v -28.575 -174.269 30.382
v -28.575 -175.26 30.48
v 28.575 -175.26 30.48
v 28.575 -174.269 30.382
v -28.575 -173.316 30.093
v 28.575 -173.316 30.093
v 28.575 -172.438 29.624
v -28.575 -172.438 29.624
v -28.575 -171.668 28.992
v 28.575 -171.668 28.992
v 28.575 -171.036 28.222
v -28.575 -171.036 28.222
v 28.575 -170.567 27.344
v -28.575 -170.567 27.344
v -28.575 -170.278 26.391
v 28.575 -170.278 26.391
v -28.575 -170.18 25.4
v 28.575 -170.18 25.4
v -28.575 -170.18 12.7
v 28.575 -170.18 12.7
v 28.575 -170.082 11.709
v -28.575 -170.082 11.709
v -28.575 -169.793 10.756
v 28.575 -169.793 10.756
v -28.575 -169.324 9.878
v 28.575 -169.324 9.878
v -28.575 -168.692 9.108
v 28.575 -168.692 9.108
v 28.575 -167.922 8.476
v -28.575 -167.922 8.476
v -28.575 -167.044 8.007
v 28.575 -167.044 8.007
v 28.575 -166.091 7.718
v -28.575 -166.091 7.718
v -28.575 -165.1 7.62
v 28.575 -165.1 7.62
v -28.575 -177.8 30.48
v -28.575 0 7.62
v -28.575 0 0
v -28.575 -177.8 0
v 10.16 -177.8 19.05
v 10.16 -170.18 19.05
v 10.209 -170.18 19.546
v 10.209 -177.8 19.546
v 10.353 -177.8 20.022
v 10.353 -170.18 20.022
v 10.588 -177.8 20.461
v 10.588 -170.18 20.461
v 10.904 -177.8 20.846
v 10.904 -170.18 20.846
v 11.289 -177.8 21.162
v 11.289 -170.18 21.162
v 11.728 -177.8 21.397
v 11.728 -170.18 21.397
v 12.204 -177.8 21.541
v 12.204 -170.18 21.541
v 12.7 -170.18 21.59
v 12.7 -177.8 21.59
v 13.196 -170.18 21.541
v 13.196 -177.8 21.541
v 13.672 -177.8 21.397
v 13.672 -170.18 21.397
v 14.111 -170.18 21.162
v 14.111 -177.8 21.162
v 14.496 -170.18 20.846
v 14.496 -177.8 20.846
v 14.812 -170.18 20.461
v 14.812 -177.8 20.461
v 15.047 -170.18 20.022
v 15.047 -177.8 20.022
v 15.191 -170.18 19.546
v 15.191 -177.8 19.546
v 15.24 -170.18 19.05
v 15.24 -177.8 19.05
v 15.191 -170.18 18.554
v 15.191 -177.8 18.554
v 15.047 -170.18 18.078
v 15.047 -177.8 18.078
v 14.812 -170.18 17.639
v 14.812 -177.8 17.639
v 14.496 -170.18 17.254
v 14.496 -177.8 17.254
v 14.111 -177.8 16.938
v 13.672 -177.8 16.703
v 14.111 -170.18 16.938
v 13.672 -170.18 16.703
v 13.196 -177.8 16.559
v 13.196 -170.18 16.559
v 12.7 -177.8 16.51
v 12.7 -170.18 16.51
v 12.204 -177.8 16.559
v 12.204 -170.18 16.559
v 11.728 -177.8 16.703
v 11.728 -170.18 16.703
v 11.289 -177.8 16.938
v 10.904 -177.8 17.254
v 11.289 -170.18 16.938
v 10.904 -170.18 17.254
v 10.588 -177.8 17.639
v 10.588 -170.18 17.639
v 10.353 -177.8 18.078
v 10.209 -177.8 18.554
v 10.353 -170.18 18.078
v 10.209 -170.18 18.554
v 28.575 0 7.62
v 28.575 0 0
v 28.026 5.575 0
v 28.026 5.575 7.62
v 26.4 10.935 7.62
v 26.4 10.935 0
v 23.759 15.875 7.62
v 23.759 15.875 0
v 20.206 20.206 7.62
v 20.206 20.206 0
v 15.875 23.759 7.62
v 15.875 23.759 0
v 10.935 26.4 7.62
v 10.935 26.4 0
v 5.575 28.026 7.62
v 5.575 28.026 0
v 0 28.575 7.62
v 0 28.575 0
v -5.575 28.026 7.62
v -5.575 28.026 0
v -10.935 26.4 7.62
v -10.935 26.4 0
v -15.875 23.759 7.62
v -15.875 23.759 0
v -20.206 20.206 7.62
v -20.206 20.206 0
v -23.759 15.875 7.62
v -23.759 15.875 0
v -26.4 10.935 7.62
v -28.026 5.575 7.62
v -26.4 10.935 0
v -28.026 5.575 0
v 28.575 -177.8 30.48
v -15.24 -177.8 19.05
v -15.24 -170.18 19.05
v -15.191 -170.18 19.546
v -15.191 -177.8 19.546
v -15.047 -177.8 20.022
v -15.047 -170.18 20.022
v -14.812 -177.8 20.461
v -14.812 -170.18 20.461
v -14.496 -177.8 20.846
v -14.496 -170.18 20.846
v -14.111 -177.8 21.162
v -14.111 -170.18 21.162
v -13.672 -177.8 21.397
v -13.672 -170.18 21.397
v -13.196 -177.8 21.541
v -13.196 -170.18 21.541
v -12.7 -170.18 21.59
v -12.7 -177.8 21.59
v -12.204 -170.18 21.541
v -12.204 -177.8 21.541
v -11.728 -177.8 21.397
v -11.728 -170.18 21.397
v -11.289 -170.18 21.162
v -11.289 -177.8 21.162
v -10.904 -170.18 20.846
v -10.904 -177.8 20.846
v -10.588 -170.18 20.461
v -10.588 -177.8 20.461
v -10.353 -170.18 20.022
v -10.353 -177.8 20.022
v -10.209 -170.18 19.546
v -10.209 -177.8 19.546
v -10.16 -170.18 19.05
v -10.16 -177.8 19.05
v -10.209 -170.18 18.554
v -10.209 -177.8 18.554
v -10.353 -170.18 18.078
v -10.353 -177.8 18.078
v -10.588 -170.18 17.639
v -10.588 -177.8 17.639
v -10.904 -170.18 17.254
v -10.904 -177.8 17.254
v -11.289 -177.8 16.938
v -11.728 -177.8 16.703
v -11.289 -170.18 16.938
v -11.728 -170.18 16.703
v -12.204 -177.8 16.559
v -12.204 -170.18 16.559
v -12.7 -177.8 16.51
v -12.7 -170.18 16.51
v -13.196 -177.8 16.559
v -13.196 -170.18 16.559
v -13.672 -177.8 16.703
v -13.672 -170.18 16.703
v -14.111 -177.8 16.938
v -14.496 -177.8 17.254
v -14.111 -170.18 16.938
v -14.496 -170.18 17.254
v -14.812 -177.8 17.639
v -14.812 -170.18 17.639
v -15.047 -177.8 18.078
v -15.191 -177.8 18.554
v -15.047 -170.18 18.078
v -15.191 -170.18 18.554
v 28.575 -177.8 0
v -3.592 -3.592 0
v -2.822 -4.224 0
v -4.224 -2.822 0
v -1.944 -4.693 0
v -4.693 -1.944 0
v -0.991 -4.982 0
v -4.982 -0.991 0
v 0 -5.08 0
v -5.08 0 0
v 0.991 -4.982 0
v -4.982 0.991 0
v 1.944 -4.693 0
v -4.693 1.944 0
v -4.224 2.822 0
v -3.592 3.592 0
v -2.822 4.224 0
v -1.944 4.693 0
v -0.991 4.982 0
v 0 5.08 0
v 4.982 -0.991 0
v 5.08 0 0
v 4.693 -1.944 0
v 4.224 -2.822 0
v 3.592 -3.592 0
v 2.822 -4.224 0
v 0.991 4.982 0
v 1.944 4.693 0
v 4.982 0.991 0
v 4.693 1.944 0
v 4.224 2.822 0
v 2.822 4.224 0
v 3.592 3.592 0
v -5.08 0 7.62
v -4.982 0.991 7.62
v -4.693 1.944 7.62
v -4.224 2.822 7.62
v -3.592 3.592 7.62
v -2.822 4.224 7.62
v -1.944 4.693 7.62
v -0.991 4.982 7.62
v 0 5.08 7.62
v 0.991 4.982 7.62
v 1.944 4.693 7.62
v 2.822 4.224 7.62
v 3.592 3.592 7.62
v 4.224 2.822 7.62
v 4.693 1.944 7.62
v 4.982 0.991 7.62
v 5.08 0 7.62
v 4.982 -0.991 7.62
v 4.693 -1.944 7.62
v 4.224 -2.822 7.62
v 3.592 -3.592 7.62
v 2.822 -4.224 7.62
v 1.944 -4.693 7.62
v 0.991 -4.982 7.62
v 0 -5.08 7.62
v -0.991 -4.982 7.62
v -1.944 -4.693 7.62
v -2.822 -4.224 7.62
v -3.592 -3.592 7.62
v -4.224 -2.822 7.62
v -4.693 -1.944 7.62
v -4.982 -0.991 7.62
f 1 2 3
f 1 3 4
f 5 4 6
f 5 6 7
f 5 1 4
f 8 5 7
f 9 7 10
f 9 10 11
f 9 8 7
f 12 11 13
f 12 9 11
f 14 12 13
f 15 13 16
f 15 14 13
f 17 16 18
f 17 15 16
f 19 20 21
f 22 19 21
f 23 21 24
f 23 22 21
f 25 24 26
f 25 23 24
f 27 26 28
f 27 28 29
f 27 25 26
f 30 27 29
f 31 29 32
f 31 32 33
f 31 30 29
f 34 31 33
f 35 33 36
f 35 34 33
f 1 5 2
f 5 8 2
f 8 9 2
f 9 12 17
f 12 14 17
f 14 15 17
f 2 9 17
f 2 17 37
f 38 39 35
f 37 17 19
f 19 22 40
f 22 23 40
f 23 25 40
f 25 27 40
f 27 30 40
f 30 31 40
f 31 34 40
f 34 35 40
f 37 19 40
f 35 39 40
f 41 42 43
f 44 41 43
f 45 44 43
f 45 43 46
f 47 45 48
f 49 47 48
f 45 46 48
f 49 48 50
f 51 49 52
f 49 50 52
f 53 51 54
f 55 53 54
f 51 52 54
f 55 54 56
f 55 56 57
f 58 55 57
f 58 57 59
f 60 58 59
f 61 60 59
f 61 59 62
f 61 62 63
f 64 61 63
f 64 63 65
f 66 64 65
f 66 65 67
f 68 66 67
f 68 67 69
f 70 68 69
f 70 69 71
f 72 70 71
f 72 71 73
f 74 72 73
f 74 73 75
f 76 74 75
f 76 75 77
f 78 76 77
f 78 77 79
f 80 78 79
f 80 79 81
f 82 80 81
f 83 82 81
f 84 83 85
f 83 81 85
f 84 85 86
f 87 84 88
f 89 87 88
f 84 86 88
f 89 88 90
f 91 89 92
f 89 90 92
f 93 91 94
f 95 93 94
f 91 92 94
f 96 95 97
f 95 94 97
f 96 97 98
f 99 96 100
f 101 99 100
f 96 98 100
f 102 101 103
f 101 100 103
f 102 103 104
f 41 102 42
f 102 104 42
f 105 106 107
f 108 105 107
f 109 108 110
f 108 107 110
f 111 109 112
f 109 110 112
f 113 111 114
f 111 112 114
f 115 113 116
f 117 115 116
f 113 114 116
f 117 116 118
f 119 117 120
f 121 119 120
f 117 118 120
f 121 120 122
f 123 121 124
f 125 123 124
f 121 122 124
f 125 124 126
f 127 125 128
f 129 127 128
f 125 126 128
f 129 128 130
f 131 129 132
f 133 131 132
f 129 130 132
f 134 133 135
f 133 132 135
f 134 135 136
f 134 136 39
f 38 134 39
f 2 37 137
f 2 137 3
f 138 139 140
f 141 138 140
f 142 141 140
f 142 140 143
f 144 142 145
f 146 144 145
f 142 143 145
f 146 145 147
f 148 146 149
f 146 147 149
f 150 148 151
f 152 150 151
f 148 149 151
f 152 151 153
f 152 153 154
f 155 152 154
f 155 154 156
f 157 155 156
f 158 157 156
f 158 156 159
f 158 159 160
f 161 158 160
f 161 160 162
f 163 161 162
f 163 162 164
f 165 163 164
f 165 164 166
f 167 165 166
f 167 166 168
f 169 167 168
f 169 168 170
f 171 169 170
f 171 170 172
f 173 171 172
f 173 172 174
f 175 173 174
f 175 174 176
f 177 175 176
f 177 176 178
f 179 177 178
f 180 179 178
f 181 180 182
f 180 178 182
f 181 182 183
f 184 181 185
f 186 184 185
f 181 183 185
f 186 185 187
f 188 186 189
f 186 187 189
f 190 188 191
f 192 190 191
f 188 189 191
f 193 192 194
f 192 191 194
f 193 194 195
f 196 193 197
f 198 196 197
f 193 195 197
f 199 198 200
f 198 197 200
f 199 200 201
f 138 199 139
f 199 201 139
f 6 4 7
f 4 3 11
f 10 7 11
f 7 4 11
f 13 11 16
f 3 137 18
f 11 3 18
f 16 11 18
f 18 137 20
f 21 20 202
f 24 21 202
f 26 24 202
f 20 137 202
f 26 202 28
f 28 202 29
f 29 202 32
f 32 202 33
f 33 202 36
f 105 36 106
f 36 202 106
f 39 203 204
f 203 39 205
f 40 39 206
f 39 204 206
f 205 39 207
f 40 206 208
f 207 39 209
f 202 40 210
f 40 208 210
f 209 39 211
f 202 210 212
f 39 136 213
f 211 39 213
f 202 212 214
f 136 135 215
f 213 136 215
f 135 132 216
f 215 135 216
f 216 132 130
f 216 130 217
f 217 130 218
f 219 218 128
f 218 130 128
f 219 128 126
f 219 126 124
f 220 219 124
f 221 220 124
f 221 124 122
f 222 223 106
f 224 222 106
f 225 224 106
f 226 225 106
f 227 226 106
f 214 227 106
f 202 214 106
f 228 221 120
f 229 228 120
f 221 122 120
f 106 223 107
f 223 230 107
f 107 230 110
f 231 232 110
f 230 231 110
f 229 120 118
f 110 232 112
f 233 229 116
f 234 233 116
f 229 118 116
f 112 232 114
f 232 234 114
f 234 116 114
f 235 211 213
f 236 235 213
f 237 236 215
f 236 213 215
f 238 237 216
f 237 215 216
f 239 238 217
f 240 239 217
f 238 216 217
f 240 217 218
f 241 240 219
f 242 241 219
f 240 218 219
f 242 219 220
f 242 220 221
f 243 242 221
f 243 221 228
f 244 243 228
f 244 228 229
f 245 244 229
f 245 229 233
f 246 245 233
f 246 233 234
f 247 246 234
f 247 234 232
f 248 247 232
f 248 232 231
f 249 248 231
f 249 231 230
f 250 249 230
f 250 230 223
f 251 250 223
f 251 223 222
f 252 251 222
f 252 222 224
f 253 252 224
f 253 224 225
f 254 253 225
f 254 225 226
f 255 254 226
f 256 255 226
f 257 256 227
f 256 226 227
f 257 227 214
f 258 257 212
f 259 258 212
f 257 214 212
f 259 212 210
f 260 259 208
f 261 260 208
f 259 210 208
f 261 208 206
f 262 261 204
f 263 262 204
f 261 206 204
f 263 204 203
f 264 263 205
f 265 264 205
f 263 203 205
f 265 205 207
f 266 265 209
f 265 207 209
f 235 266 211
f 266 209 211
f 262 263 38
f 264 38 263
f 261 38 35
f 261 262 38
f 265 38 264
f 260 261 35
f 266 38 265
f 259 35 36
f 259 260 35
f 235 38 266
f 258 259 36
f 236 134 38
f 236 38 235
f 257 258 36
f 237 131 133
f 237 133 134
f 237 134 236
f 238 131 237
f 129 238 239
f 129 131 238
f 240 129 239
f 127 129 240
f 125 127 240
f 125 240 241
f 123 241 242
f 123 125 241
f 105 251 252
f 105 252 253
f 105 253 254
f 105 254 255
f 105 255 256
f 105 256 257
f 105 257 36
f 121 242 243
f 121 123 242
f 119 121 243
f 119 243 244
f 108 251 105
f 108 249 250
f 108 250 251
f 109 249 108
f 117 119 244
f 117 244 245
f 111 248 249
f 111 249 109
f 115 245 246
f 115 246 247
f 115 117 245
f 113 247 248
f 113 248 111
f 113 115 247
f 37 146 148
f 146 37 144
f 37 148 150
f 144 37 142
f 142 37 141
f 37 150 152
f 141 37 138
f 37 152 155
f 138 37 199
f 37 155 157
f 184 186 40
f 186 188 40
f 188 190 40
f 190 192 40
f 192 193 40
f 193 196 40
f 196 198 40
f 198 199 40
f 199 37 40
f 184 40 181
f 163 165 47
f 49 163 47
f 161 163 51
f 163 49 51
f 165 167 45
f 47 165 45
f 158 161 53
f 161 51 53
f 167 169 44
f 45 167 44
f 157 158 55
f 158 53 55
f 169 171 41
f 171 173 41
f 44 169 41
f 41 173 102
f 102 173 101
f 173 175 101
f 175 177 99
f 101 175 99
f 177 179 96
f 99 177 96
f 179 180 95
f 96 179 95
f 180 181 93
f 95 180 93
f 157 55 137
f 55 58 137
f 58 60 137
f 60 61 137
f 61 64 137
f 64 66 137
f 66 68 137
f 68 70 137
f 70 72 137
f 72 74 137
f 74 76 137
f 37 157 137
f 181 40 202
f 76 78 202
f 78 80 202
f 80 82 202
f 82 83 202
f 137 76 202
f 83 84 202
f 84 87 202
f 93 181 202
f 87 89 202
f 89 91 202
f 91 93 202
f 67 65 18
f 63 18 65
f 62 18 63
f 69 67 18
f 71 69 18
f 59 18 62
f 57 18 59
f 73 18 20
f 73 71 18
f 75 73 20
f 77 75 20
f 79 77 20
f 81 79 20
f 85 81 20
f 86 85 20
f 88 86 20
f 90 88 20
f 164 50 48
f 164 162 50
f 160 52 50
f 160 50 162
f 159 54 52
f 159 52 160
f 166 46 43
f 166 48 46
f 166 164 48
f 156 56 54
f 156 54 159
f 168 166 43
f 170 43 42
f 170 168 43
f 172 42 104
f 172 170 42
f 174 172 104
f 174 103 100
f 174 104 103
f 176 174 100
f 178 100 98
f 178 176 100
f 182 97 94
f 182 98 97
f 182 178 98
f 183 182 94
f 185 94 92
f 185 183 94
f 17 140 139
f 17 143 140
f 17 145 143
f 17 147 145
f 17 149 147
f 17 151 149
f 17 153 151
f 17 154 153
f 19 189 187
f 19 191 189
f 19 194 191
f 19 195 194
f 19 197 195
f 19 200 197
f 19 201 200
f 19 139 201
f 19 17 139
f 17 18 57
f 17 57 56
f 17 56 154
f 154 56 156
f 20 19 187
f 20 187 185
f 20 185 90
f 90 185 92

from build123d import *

# Parameters (mm, degrees)
BOSS_EXTRUDE1_DEPTH = 7.62
BOSS_EXTRUDE2_DEPTH = 57.15
FILLET1_R           = 5.08
SKETCH3_R           = 2.54
CUT_EXTRUDE1_DEPTH  = 204.09877166
SKETCH4_R           = 5.08
CUT_EXTRUDE2_DEPTH  = 183.642823634


with BuildPart() as part:
    # Sketch1 → Boss-Extrude1 (new body)
    with BuildSketch(Plane.XY):
        with BuildLine():
            Line((-28.575, 0), (-28.575, -177.8))
            Line((-28.575, -177.8), (28.575, -177.8))
            Line((28.575, -177.8), (28.575, 0))
            ThreePointArc((28.575, 0), (0, 28.575), (-28.575, 0))
        make_face()
    extrude(amount=BOSS_EXTRUDE1_DEPTH)

    # Sketch2 → Boss-Extrude2 (add, through all)
    with BuildSketch(Plane.ZY.offset(28.575)):
        with BuildLine():
            Line((0, -177.8), (30.48, -177.8))
            Line((30.48, -177.8), (30.48, -175.26))
            ThreePointArc((30.48, -175.26), (28.992102448, -171.667897552), (25.4, -170.18))
            Line((25.4, -170.18), (0, -170.18))
            Line((0, -170.18), (0, -177.8))
        make_face()
    extrude(amount=-BOSS_EXTRUDE2_DEPTH)

    # Fillet1
    fillet1_edges = [part.edges().sort_by_distance(p)[0] for p in [
        (0, -170.18, 7.62),
    ]]
    fillet(fillet1_edges, radius=FILLET1_R)

    # Sketch3 → Cut-Extrude1 (cut, through all)
    with BuildSketch(Plane(origin=(0, -170.18, 0), x_dir=(1, 0, 0), z_dir=(0, 1, 0))):
        with Locations(Location((12.7, -19.05, 0), (0, 0, 180))):
            Circle(SKETCH3_R)
        with Locations(Location((-12.7, -19.05, 0), (0, 0, 180))):
            Circle(SKETCH3_R)
    extrude(amount=-CUT_EXTRUDE1_DEPTH, mode=Mode.SUBTRACT)

    # Sketch4 → Cut-Extrude2 (cut, through all)
    with BuildSketch(Plane(origin=(0, 0, 0), x_dir=(-1, 0, 0), z_dir=(0, 0, -1))):
        Circle(SKETCH4_R)
    extrude(amount=-CUT_EXTRUDE2_DEPTH, mode=Mode.SUBTRACT)


solid = part.part
